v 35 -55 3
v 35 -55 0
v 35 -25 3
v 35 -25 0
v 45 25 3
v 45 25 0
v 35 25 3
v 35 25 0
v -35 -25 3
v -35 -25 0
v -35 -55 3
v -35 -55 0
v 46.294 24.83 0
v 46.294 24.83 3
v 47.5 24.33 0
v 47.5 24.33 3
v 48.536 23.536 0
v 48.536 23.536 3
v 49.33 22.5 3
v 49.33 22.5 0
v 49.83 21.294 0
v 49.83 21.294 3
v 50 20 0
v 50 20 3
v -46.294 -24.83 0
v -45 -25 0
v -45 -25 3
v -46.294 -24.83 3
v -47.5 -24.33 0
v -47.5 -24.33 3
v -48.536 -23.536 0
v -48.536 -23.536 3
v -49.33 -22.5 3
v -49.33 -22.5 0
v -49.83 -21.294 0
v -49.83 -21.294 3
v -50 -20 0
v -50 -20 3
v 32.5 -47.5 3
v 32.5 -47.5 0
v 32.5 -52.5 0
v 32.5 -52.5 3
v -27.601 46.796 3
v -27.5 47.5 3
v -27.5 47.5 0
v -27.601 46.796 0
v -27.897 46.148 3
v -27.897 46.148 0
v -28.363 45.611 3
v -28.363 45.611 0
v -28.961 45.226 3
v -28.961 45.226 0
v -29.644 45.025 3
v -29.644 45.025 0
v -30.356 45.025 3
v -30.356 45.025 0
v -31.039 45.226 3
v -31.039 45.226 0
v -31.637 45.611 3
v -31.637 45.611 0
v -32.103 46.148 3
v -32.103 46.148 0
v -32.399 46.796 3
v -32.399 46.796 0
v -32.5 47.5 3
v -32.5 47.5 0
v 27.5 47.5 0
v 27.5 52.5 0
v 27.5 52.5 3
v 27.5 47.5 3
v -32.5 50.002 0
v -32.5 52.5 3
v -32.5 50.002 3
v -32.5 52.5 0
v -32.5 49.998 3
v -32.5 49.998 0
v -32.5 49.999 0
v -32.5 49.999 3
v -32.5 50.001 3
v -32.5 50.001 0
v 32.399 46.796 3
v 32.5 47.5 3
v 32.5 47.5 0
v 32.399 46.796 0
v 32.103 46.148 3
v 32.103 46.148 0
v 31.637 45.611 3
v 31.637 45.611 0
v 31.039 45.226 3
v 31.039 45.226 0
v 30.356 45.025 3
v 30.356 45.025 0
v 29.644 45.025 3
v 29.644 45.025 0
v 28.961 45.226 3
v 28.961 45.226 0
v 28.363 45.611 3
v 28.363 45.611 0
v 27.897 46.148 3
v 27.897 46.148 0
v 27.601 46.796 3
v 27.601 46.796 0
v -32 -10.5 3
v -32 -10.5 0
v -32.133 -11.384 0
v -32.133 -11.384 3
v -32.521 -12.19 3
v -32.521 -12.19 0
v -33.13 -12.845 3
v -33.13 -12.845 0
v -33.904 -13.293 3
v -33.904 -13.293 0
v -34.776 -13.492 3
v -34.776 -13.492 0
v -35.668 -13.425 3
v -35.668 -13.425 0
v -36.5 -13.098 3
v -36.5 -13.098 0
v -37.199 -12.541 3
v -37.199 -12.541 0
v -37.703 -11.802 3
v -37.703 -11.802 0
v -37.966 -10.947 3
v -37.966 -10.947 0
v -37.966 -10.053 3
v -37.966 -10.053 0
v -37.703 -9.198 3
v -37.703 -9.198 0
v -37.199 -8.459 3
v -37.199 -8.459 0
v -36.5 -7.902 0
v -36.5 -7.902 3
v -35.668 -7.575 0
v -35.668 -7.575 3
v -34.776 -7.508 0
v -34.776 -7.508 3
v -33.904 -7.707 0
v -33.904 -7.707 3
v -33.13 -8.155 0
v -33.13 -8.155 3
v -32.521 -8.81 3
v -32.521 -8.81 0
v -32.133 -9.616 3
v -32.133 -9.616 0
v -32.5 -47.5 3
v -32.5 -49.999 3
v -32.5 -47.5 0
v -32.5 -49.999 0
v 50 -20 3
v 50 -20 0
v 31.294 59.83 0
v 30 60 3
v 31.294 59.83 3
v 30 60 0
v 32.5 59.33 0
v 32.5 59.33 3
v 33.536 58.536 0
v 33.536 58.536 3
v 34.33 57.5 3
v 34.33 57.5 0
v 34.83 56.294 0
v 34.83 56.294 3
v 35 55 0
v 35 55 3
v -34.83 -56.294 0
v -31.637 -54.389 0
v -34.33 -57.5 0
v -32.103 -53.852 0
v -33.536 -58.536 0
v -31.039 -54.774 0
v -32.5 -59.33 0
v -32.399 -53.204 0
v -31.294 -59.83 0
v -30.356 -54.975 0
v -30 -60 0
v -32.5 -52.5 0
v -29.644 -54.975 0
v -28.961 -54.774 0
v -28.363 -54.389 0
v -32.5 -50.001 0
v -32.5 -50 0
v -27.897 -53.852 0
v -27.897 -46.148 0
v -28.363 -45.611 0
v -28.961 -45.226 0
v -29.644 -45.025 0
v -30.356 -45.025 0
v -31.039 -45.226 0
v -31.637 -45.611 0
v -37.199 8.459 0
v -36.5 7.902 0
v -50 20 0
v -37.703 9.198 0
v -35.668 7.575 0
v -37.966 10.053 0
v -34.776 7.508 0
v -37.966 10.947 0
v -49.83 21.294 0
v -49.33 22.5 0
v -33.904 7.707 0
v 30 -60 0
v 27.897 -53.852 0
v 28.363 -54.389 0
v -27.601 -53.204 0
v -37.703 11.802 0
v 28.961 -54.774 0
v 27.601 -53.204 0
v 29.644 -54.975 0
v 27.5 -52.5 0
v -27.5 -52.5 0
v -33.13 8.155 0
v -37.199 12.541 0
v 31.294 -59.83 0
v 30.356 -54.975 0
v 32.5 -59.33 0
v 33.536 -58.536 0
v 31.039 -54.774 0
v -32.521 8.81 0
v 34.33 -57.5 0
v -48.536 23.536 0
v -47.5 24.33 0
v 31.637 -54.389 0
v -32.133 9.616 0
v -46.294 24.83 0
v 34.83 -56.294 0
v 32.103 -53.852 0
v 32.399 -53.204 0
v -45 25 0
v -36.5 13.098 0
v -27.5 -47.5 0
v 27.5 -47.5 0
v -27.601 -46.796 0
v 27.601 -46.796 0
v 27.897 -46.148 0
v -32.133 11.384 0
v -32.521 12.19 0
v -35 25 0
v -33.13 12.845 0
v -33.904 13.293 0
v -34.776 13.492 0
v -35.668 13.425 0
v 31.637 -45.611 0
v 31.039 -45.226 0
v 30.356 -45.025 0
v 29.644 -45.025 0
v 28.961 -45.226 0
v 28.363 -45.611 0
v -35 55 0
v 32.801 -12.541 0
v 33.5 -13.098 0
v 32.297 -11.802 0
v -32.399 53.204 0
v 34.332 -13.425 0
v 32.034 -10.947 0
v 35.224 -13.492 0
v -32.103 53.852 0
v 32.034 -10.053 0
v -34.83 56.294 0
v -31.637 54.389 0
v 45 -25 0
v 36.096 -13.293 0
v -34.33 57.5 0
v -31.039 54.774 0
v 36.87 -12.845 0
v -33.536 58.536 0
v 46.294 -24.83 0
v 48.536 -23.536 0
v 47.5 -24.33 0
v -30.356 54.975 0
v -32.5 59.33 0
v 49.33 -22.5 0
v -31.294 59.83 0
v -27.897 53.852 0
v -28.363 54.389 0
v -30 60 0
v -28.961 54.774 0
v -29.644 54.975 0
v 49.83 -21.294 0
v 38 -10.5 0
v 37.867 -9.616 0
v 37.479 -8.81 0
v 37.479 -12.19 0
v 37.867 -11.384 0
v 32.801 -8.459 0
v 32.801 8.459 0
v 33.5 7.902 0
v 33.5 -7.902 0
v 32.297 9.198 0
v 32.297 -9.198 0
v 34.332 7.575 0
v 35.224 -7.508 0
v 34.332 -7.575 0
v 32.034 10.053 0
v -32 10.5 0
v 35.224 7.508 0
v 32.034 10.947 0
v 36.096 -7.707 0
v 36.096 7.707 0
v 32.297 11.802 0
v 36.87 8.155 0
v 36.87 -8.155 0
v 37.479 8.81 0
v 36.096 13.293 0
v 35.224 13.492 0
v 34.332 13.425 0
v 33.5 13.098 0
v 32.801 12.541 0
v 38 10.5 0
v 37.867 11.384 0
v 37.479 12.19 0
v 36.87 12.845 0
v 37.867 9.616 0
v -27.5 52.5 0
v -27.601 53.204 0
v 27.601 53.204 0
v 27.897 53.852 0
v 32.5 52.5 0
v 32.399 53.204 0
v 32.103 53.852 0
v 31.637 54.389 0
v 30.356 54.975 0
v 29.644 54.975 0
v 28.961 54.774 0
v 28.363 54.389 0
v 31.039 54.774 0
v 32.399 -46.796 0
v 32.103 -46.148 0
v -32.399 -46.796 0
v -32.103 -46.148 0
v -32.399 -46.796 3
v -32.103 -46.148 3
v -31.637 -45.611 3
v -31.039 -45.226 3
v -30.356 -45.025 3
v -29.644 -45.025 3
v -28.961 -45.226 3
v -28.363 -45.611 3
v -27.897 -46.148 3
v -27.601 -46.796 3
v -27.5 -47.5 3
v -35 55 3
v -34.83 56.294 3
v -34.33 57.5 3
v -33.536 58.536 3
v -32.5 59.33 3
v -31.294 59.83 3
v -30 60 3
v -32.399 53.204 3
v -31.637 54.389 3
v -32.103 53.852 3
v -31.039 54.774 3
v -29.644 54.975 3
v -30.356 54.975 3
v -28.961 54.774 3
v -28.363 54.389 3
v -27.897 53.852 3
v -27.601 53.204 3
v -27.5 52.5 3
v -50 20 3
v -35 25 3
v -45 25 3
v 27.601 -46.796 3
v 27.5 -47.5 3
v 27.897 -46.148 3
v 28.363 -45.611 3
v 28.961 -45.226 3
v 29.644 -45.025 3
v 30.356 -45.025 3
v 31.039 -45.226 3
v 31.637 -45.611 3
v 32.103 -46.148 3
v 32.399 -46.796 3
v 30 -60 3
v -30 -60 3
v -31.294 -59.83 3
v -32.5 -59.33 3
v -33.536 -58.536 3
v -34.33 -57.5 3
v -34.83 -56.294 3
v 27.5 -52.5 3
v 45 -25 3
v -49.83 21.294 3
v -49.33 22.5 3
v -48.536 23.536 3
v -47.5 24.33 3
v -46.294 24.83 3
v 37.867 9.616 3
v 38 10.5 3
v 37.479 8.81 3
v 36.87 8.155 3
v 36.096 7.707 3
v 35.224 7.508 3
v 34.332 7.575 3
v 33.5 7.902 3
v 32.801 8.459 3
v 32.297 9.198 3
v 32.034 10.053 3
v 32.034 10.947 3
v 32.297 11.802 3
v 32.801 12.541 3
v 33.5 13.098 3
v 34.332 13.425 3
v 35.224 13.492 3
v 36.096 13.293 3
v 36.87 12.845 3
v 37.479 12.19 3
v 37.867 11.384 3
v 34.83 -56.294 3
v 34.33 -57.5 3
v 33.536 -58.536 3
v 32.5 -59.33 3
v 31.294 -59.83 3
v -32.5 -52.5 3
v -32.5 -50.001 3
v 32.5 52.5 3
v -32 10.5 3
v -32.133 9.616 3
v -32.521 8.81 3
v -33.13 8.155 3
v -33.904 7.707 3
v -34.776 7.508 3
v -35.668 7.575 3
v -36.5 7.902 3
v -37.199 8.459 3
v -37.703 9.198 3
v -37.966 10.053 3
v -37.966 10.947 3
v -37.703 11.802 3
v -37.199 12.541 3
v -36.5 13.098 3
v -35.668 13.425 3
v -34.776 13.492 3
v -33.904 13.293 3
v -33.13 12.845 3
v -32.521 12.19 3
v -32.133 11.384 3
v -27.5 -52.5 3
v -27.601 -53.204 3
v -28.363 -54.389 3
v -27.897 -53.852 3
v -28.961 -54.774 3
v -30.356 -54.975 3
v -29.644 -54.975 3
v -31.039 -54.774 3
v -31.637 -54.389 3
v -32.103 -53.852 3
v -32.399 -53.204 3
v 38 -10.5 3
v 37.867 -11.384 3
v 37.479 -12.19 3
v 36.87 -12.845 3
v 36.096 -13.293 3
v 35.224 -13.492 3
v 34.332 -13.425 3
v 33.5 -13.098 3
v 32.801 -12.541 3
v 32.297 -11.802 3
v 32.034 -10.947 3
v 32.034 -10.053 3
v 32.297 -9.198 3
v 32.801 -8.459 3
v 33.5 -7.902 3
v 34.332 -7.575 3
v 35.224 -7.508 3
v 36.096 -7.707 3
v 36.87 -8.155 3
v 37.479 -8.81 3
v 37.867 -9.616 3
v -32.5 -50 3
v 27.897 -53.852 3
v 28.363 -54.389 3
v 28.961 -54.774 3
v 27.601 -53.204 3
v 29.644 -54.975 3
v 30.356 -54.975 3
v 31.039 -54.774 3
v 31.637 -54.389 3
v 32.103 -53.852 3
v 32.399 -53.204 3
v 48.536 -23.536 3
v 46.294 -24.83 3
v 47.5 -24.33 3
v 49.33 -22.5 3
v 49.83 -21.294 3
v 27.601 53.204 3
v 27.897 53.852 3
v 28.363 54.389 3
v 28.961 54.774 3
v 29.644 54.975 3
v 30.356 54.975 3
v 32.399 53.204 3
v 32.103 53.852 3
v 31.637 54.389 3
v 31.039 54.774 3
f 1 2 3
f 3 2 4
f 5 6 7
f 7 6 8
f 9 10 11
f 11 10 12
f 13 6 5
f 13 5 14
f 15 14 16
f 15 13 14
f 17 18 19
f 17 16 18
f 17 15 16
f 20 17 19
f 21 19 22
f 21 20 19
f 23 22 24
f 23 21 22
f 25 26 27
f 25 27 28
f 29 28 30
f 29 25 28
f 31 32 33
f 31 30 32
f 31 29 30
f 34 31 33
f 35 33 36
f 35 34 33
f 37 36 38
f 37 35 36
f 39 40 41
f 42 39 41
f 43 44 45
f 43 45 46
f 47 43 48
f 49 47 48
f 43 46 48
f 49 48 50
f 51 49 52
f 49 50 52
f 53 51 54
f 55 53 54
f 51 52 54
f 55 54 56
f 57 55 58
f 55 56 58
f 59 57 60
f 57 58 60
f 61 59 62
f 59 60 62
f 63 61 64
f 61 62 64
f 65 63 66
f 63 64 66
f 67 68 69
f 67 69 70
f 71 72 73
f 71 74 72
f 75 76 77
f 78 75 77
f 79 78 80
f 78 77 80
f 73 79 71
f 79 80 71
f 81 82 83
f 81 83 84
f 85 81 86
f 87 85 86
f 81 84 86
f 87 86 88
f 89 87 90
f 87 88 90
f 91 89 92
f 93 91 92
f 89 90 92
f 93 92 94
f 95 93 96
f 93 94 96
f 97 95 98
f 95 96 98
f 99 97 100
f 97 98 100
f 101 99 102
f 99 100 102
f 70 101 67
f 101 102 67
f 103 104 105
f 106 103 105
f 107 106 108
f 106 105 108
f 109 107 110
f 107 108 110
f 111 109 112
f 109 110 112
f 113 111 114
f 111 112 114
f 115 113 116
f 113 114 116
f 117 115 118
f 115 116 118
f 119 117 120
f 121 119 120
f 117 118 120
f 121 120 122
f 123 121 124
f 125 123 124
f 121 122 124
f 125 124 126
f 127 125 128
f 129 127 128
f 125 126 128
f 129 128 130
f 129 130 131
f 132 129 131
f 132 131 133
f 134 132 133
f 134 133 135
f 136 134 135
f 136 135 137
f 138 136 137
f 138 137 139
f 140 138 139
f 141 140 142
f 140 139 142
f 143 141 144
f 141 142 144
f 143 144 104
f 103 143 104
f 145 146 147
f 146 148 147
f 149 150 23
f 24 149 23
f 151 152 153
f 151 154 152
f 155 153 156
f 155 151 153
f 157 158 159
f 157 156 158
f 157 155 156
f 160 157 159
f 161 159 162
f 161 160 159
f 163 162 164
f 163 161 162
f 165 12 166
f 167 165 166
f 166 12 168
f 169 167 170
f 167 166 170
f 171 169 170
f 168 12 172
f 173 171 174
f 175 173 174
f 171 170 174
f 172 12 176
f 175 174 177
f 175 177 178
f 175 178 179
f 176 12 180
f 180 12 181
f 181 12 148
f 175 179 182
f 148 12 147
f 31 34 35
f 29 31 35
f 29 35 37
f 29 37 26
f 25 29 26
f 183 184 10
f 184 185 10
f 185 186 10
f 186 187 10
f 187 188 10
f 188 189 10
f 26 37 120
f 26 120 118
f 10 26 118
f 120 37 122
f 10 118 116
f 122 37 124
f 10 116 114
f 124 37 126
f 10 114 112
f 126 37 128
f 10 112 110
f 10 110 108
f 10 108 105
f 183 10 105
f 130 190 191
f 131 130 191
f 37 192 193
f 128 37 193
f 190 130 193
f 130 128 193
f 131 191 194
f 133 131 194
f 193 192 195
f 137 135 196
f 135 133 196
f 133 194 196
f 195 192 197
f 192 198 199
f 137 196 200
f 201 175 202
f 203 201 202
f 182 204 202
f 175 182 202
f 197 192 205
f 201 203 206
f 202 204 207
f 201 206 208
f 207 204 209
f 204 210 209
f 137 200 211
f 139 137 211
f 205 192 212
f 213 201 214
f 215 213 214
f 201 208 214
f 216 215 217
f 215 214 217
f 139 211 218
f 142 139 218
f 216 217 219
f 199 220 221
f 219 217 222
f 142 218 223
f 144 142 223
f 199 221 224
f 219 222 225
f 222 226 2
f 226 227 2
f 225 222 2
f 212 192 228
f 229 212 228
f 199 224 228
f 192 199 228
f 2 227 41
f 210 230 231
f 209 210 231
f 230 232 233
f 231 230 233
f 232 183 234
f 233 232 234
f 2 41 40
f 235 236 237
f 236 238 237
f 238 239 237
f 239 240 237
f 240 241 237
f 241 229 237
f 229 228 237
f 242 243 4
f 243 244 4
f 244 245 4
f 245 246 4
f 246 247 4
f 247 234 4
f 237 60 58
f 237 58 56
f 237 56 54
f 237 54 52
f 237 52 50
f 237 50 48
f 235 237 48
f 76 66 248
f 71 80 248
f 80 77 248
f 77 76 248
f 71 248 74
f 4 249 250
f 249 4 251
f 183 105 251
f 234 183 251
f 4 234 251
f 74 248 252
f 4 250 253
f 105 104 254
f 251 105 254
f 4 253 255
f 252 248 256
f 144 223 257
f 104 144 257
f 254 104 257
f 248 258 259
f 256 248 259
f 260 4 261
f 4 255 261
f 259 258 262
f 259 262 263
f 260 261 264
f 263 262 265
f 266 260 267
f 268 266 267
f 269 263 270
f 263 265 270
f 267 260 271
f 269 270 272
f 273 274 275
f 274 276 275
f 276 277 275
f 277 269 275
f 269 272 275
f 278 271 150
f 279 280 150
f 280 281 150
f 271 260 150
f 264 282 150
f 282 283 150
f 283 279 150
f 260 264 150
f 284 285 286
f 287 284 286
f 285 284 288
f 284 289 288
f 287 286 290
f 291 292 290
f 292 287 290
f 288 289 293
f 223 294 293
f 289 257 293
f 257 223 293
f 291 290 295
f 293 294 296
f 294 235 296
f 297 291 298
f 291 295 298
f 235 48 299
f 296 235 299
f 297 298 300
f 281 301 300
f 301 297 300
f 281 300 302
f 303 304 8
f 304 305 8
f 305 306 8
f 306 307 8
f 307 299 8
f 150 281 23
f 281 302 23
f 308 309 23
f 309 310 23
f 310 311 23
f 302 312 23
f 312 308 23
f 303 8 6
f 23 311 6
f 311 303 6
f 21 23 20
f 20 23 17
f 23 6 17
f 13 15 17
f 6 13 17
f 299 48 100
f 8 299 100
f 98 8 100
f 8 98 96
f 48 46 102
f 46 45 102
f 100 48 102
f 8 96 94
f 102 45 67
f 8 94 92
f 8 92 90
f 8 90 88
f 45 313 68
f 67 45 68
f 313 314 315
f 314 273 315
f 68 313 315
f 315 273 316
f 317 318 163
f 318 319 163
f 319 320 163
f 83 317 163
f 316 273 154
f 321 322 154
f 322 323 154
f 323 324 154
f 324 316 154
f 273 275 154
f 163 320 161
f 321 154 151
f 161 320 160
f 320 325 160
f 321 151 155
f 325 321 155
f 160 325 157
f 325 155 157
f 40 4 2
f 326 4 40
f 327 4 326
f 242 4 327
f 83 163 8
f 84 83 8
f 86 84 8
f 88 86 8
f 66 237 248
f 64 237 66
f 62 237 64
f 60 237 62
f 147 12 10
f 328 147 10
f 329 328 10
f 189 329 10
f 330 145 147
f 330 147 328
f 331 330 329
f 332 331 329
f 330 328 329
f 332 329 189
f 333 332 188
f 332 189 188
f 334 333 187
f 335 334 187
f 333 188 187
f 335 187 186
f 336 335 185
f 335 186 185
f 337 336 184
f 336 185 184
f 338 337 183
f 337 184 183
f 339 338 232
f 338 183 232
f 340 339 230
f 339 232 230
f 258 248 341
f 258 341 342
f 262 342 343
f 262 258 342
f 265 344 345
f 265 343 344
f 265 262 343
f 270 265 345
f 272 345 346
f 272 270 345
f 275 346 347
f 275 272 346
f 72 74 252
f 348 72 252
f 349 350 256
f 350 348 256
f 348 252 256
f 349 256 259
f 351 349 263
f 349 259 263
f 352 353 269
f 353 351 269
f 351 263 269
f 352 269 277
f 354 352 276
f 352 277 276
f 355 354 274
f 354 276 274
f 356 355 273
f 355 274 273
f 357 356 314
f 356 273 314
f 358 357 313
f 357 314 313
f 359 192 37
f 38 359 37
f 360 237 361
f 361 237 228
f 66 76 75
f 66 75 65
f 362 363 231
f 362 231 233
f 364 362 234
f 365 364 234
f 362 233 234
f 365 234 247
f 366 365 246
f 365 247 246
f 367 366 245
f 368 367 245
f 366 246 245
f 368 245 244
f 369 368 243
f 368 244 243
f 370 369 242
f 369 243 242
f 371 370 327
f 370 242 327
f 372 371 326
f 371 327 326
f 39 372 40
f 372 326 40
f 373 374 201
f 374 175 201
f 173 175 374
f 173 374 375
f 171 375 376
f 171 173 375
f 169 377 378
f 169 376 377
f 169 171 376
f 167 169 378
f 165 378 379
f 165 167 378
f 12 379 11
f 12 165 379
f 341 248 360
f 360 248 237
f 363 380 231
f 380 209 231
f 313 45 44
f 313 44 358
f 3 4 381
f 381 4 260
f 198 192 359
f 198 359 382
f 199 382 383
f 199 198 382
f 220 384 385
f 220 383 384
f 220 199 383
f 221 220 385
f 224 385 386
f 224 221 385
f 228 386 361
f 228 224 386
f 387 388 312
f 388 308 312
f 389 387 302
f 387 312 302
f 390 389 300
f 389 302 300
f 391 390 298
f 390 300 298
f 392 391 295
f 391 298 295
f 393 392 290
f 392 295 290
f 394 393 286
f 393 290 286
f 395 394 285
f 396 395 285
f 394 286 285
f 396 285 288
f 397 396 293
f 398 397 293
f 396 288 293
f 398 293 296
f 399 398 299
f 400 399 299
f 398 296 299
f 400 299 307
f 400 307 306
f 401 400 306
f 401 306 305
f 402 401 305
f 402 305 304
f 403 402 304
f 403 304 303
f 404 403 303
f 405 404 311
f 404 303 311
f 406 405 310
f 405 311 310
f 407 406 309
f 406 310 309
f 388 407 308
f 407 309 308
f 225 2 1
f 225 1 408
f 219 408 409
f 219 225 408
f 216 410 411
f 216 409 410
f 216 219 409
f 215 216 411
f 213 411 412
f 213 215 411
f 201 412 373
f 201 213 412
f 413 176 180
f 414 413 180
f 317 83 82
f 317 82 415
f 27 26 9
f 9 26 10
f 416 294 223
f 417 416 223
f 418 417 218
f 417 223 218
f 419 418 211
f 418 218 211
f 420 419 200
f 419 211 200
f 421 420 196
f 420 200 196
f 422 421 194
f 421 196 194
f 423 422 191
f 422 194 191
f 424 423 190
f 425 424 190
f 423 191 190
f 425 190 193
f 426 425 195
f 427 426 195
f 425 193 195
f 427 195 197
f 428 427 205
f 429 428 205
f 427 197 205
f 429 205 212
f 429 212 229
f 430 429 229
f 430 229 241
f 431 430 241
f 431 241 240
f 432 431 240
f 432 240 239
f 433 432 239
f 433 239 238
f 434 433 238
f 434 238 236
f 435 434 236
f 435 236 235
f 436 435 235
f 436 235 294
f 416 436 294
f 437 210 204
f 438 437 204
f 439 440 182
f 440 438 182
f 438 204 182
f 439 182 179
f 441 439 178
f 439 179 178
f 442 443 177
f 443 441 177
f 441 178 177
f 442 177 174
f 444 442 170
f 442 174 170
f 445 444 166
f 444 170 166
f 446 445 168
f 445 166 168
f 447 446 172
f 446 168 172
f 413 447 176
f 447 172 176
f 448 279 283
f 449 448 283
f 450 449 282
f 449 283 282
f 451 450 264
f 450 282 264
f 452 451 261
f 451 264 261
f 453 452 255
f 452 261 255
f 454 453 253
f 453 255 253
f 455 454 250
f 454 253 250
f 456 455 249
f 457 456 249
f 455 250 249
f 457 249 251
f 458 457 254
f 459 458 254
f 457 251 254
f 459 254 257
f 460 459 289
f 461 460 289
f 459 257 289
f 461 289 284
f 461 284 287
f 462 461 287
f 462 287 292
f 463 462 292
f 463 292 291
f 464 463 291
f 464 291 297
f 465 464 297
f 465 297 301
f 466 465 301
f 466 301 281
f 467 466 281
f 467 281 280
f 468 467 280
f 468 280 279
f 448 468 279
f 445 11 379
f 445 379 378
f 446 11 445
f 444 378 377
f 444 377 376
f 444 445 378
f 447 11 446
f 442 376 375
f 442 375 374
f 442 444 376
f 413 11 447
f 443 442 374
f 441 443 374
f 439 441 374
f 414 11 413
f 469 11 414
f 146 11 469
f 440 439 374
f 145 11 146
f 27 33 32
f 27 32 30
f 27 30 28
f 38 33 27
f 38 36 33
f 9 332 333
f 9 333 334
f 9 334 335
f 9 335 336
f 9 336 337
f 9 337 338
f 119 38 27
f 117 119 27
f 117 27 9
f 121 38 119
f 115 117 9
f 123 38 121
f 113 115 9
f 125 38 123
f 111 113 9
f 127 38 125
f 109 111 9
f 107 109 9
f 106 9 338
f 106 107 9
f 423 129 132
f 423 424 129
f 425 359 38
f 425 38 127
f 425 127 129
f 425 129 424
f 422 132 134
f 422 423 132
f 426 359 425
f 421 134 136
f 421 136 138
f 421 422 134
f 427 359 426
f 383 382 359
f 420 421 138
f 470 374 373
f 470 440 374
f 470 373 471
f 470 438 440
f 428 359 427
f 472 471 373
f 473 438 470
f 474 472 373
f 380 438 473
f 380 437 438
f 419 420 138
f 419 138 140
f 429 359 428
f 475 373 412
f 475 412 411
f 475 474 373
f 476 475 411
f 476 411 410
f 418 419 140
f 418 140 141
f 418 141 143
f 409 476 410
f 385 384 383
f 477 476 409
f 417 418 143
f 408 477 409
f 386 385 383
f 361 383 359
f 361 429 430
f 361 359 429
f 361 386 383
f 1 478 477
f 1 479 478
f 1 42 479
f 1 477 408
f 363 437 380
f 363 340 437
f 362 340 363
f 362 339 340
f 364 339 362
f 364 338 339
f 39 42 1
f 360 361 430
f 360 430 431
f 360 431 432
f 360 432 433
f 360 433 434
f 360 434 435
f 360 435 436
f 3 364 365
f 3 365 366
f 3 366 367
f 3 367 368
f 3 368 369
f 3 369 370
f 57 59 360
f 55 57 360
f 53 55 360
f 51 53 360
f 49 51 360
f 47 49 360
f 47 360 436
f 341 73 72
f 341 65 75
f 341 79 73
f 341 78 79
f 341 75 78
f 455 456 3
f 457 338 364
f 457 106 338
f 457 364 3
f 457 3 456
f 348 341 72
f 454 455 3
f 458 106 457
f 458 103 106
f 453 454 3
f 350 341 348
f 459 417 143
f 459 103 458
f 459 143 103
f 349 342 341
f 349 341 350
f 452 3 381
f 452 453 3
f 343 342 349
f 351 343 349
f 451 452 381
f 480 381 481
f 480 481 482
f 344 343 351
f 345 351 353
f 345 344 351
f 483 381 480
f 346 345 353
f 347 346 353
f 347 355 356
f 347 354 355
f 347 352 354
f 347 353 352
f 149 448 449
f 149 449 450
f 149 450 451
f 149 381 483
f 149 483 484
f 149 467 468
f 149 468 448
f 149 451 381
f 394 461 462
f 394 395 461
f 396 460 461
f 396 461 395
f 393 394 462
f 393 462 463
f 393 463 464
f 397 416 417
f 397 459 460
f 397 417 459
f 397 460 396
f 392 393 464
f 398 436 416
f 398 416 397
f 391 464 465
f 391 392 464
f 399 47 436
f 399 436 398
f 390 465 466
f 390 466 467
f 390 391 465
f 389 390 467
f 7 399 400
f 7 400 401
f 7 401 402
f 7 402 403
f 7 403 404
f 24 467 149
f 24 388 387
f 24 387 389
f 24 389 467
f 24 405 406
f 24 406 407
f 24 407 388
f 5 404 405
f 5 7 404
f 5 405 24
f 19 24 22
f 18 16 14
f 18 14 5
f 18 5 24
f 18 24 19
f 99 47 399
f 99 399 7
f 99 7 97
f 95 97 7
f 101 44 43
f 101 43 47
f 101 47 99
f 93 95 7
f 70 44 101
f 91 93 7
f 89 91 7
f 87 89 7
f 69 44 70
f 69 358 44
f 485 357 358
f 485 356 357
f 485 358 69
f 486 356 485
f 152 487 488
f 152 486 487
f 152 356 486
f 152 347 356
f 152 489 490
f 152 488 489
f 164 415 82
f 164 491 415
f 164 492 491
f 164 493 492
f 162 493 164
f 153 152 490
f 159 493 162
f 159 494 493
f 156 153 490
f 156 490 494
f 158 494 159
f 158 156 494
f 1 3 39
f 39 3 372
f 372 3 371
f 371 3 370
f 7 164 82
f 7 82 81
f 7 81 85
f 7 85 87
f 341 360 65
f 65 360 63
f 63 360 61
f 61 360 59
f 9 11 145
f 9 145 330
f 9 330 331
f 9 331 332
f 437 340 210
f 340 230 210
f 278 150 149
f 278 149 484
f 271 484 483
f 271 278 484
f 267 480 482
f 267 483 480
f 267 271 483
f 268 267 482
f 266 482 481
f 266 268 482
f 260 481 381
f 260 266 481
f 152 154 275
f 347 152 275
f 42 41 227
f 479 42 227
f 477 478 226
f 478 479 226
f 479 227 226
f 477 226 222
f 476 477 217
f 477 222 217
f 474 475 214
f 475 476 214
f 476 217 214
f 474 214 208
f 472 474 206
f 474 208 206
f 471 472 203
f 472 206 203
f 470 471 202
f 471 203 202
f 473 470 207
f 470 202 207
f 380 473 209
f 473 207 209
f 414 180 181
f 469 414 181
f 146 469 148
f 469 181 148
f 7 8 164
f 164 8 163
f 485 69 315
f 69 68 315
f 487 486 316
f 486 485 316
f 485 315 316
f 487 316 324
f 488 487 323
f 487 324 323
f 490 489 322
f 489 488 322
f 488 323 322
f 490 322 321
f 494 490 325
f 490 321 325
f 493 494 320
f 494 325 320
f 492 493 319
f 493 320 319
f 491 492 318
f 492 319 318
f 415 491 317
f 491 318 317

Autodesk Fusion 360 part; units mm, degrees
sketch "Sketch1" plane through (0, 0, 0) normal (0, 0, 1) x (1, 0, 0)
  line L0 (30, 50) -> (-30, 50)
  line L1 (-30, 50) -> (-30, -50)
  line L2 (-30, -50) -> (30, -50)
  line L3 (30, -50) -> (30, 50)
  line L4 (30, 50) -> (-30, -50) construction
  line L5 (-30, 50) -> (30, -50) construction
  line L6 (45, 25) -> (-45, 25)
  line L7 (-50, 20) -> (-50, -20)
  line L8 (-45, -25) -> (45, -25)
  line L9 (50, -20) -> (50, 20)
  line L10 (50, 25) -> (-50, -25) construction
  line L11 (-50, 25) -> (50, -25) construction
  line L12 (35, 10.5) -> (-35, 10.5) construction
  line L13 (-35, 10.5) -> (-35, -10.5) construction
  line L14 (-35, -10.5) -> (35, -10.5) construction
  line L15 (35, -10.5) -> (35, 10.5) construction
  line L16 (35, 10.5) -> (-35, -10.5) construction
  line L17 (-35, 10.5) -> (35, -10.5) construction
  circle A0 centre (-35, 10.5) radius 3
  circle A1 centre (-35, -10.5) radius 3
  circle A2 centre (35, 10.5) radius 3
  circle A3 centre (35, -10.5) radius 3
  line L18 (-27.5, 47.5) -> (-27.5, 52.5)
  arc A4 (-27.5, 52.5) -> (-32.5, 52.5) centre (-30, 52.5) ccw
  line L19 (-32.5, 52.5) -> (-32.5, 47.5)
  arc A5 (-32.5, 47.5) -> (-27.5, 47.5) centre (-30, 47.5) ccw
  line L20 (-30, 47.5) -> (-30, 52.5) construction
  line L21 (32.5, 47.5) -> (32.5, 52.5)
  arc A6 (32.5, 52.5) -> (27.5, 52.5) centre (30, 52.5) ccw
  line L22 (27.5, 52.5) -> (27.5, 47.5)
  arc A7 (27.5, 47.5) -> (32.5, 47.5) centre (30, 47.5) ccw
  line L23 (30, 47.5) -> (30, 52.5) construction
  line L24 (-70, 0) -> (55, 0) construction
  arc A8 (-32.5, -52.5) -> (-27.5, -52.5) centre (-30, -52.5) ccw
  line L25 (-32.5, -52.5) -> (-32.5, -47.5)
  line L26 (-27.5, -47.5) -> (-27.5, -52.5)
  arc A9 (-27.5, -47.5) -> (-32.5, -47.5) centre (-30, -47.5) ccw
  arc A10 (32.5, -47.5) -> (27.5, -47.5) centre (30, -47.5) ccw
  arc A11 (27.5, -52.5) -> (32.5, -52.5) centre (30, -52.5) ccw
  line L27 (27.5, -52.5) -> (27.5, -47.5)
  line L28 (32.5, -47.5) -> (32.5, -52.5)
  line L29 (30, 60) -> (-30, 60)
  line L30 (-35, 55) -> (-35, -55)
  line L31 (-30, -60) -> (30, -60)
  line L32 (35, -55) -> (35, 55)
  line L33 (35, 60) -> (-35, -60) construction
  line L34 (-35, 60) -> (35, -60) construction
  arc A12 (-30, 60) -> (-35, 55) centre (-30, 55) ccw
  arc A13 (35, 55) -> (30, 60) centre (30, 55) ccw
  arc A14 (-35, -55) -> (-30, -60) centre (-30, -55) ccw
  arc A15 (30, -60) -> (35, -55) centre (30, -55) ccw
  arc A16 (-27.5, -50.0014) -> (-27.5, -49.9986) centre (-30, -50) ccw
  arc A17 (-32.5, -49.9986) -> (-32.5, -50.0014) centre (-30, -50) ccw
  arc A18 (-32.5, 50.0024) -> (-32.5, 49.9976) centre (-30, 50) ccw
  arc A19 (-27.5, 50) -> (-27.5, 50.0014) centre (-30, 50) ccw
  arc A20 (50, 20) -> (45, 25) centre (45, 20) ccw
  arc A21 (45, -25) -> (50, -20) centre (45, -20) ccw
  arc A22 (-50, -20) -> (-45, -25) centre (-45, -20) ccw
  arc A23 (-45, 25) -> (-50, 20) centre (-45, 20) ccw
  point P0 (-30, 50)
  point P1 (30, 50)
  dimension "d1" = 60
  dimension "d2" = 100
  dimension "d5" = 5
  dimension "d7" = 100
  dimension "d8" = 50
  dimension "d9" = 70
  dimension "d10" = 21
  dimension "d12" = 6
  dimension "d13" = 6
  dimension "d14" = 6
  dimension "d15" = 6
  dimension "d16" = 5
  dimension "d17" = 70
  dimension "d18" = 120
  dimension "d19" = 5
  dimension "d20" = 5
extrude "Extrude1" add sketch "Sketch1" along normal blind 3 contours L0 L1 L3 L6 L18 A4 L19 A5 L21 A6 L22 A7 L29 L30 L32 A12 A13 A18 A19 | L0 L1 L3 L6 L18 A5 L22 A7 | L1 L3 L6 L8 | L1 L6 L8 A0 A1 L30 | L3 L6 L8 A2 A3 L32 | L1 L2 L3 L8 L26 A9 A10 L27 | L1 L2 L3 L8 A8 L25 L26 A9 A10 A11 L27 L28 L30 L31 L32 A14 A15 A17 | L6 L7 L8 A0 A1 L30 A22 A23 | L6 L8 L9 A2 A3 L32 A20 A21
sketch "dfx_export" plane through (0, 0, 3) normal (0, 0, 1) x (1, 0, 0)
  arc A0 (-27.5, -47.5) -> (-32.5, -47.5) centre (-30, -47.5) ccw
  line L0 (-27.5, -47.5) -> (-27.5, -49.9986)
  arc A1 (-27.5, -50.0014) -> (-27.5, -49.9986) centre (-30, -50) ccw
  line L1 (-27.5, -50.0014) -> (-27.5, -52.5)
  arc A2 (-32.5, -52.5) -> (-27.5, -52.5) centre (-30, -52.5) ccw
  line L2 (-32.5, -52.5) -> (-32.5, -50.0014)
  arc A3 (-32.5, -49.9986) -> (-32.5, -50.0014) centre (-30, -50) ccw
  line L3 (-32.5, -49.9986) -> (-32.5, -47.5)
  arc A4 (27.5, 47.5) -> (32.5, 47.5) centre (30, 47.5) ccw
  line L4 (27.5, 47.5) -> (27.5, 52.5)
  arc A5 (32.5, 52.5) -> (27.5, 52.5) centre (30, 52.5) ccw
  line L5 (32.5, 52.5) -> (32.5, 47.5)
  arc A6 (-27.5, 50) -> (-27.5, 50.0014) centre (-30, 50) ccw
  line L6 (-27.5, 50) -> (-27.5, 47.5)
  arc A7 (-32.5, 47.5) -> (-27.5, 47.5) centre (-30, 47.5) ccw
  line L7 (-32.5, 47.5) -> (-32.5, 49.9976)
  arc A8 (-32.5, 50.0024) -> (-32.5, 49.9976) centre (-30, 50) ccw
  line L8 (-32.5, 50.0024) -> (-32.5, 52.5)
  arc A9 (-27.5, 52.5) -> (-32.5, 52.5) centre (-30, 52.5) ccw
  line L9 (-27.5, 52.5) -> (-27.5, 50.0014)
  arc A10 (27.5, -52.5) -> (32.5, -52.5) centre (30, -52.5) ccw
  line L10 (27.5, -52.5) -> (27.5, -47.5)
  arc A11 (32.5, -47.5) -> (27.5, -47.5) centre (30, -47.5) ccw
  line L11 (32.5, -47.5) -> (32.5, -52.5)
  circle A12 centre (35, -10.5) radius 3
  circle A13 centre (35, 10.5) radius 3
  circle A14 centre (-35, 10.5) radius 3
  circle A15 centre (-35, -10.5) radius 3
  arc A16 (-45, 25) -> (-50, 20) centre (-45, 20) ccw
  line L12 (-50, 20) -> (-50, -20)
  arc A17 (-50, -20) -> (-45, -25) centre (-45, -20) ccw
  line L13 (-45, -25) -> (-35, -25)
  line L14 (-35, -25) -> (-35, -55)
  arc A18 (-35, -55) -> (-30, -60) centre (-30, -55) ccw
  line L15 (-30, -60) -> (30, -60)
  arc A19 (30, -60) -> (35, -55) centre (30, -55) ccw
  line L16 (35, -55) -> (35, -25)
  line L17 (35, -25) -> (45, -25)
  arc A20 (45, -25) -> (50, -20) centre (45, -20) ccw
  line L18 (50, -20) -> (50, 20)
  arc A21 (50, 20) -> (45, 25) centre (45, 20) ccw
  line L19 (45, 25) -> (35, 25)
  line L20 (35, 25) -> (35, 55)
  arc A22 (35, 55) -> (30, 60) centre (30, 55) ccw
  line L21 (30, 60) -> (-30, 60)
  arc A23 (-30, 60) -> (-35, 55) centre (-30, 55) ccw
  line L22 (-35, 55) -> (-35, 25)
  line L23 (-35, 25) -> (-45, 25)
